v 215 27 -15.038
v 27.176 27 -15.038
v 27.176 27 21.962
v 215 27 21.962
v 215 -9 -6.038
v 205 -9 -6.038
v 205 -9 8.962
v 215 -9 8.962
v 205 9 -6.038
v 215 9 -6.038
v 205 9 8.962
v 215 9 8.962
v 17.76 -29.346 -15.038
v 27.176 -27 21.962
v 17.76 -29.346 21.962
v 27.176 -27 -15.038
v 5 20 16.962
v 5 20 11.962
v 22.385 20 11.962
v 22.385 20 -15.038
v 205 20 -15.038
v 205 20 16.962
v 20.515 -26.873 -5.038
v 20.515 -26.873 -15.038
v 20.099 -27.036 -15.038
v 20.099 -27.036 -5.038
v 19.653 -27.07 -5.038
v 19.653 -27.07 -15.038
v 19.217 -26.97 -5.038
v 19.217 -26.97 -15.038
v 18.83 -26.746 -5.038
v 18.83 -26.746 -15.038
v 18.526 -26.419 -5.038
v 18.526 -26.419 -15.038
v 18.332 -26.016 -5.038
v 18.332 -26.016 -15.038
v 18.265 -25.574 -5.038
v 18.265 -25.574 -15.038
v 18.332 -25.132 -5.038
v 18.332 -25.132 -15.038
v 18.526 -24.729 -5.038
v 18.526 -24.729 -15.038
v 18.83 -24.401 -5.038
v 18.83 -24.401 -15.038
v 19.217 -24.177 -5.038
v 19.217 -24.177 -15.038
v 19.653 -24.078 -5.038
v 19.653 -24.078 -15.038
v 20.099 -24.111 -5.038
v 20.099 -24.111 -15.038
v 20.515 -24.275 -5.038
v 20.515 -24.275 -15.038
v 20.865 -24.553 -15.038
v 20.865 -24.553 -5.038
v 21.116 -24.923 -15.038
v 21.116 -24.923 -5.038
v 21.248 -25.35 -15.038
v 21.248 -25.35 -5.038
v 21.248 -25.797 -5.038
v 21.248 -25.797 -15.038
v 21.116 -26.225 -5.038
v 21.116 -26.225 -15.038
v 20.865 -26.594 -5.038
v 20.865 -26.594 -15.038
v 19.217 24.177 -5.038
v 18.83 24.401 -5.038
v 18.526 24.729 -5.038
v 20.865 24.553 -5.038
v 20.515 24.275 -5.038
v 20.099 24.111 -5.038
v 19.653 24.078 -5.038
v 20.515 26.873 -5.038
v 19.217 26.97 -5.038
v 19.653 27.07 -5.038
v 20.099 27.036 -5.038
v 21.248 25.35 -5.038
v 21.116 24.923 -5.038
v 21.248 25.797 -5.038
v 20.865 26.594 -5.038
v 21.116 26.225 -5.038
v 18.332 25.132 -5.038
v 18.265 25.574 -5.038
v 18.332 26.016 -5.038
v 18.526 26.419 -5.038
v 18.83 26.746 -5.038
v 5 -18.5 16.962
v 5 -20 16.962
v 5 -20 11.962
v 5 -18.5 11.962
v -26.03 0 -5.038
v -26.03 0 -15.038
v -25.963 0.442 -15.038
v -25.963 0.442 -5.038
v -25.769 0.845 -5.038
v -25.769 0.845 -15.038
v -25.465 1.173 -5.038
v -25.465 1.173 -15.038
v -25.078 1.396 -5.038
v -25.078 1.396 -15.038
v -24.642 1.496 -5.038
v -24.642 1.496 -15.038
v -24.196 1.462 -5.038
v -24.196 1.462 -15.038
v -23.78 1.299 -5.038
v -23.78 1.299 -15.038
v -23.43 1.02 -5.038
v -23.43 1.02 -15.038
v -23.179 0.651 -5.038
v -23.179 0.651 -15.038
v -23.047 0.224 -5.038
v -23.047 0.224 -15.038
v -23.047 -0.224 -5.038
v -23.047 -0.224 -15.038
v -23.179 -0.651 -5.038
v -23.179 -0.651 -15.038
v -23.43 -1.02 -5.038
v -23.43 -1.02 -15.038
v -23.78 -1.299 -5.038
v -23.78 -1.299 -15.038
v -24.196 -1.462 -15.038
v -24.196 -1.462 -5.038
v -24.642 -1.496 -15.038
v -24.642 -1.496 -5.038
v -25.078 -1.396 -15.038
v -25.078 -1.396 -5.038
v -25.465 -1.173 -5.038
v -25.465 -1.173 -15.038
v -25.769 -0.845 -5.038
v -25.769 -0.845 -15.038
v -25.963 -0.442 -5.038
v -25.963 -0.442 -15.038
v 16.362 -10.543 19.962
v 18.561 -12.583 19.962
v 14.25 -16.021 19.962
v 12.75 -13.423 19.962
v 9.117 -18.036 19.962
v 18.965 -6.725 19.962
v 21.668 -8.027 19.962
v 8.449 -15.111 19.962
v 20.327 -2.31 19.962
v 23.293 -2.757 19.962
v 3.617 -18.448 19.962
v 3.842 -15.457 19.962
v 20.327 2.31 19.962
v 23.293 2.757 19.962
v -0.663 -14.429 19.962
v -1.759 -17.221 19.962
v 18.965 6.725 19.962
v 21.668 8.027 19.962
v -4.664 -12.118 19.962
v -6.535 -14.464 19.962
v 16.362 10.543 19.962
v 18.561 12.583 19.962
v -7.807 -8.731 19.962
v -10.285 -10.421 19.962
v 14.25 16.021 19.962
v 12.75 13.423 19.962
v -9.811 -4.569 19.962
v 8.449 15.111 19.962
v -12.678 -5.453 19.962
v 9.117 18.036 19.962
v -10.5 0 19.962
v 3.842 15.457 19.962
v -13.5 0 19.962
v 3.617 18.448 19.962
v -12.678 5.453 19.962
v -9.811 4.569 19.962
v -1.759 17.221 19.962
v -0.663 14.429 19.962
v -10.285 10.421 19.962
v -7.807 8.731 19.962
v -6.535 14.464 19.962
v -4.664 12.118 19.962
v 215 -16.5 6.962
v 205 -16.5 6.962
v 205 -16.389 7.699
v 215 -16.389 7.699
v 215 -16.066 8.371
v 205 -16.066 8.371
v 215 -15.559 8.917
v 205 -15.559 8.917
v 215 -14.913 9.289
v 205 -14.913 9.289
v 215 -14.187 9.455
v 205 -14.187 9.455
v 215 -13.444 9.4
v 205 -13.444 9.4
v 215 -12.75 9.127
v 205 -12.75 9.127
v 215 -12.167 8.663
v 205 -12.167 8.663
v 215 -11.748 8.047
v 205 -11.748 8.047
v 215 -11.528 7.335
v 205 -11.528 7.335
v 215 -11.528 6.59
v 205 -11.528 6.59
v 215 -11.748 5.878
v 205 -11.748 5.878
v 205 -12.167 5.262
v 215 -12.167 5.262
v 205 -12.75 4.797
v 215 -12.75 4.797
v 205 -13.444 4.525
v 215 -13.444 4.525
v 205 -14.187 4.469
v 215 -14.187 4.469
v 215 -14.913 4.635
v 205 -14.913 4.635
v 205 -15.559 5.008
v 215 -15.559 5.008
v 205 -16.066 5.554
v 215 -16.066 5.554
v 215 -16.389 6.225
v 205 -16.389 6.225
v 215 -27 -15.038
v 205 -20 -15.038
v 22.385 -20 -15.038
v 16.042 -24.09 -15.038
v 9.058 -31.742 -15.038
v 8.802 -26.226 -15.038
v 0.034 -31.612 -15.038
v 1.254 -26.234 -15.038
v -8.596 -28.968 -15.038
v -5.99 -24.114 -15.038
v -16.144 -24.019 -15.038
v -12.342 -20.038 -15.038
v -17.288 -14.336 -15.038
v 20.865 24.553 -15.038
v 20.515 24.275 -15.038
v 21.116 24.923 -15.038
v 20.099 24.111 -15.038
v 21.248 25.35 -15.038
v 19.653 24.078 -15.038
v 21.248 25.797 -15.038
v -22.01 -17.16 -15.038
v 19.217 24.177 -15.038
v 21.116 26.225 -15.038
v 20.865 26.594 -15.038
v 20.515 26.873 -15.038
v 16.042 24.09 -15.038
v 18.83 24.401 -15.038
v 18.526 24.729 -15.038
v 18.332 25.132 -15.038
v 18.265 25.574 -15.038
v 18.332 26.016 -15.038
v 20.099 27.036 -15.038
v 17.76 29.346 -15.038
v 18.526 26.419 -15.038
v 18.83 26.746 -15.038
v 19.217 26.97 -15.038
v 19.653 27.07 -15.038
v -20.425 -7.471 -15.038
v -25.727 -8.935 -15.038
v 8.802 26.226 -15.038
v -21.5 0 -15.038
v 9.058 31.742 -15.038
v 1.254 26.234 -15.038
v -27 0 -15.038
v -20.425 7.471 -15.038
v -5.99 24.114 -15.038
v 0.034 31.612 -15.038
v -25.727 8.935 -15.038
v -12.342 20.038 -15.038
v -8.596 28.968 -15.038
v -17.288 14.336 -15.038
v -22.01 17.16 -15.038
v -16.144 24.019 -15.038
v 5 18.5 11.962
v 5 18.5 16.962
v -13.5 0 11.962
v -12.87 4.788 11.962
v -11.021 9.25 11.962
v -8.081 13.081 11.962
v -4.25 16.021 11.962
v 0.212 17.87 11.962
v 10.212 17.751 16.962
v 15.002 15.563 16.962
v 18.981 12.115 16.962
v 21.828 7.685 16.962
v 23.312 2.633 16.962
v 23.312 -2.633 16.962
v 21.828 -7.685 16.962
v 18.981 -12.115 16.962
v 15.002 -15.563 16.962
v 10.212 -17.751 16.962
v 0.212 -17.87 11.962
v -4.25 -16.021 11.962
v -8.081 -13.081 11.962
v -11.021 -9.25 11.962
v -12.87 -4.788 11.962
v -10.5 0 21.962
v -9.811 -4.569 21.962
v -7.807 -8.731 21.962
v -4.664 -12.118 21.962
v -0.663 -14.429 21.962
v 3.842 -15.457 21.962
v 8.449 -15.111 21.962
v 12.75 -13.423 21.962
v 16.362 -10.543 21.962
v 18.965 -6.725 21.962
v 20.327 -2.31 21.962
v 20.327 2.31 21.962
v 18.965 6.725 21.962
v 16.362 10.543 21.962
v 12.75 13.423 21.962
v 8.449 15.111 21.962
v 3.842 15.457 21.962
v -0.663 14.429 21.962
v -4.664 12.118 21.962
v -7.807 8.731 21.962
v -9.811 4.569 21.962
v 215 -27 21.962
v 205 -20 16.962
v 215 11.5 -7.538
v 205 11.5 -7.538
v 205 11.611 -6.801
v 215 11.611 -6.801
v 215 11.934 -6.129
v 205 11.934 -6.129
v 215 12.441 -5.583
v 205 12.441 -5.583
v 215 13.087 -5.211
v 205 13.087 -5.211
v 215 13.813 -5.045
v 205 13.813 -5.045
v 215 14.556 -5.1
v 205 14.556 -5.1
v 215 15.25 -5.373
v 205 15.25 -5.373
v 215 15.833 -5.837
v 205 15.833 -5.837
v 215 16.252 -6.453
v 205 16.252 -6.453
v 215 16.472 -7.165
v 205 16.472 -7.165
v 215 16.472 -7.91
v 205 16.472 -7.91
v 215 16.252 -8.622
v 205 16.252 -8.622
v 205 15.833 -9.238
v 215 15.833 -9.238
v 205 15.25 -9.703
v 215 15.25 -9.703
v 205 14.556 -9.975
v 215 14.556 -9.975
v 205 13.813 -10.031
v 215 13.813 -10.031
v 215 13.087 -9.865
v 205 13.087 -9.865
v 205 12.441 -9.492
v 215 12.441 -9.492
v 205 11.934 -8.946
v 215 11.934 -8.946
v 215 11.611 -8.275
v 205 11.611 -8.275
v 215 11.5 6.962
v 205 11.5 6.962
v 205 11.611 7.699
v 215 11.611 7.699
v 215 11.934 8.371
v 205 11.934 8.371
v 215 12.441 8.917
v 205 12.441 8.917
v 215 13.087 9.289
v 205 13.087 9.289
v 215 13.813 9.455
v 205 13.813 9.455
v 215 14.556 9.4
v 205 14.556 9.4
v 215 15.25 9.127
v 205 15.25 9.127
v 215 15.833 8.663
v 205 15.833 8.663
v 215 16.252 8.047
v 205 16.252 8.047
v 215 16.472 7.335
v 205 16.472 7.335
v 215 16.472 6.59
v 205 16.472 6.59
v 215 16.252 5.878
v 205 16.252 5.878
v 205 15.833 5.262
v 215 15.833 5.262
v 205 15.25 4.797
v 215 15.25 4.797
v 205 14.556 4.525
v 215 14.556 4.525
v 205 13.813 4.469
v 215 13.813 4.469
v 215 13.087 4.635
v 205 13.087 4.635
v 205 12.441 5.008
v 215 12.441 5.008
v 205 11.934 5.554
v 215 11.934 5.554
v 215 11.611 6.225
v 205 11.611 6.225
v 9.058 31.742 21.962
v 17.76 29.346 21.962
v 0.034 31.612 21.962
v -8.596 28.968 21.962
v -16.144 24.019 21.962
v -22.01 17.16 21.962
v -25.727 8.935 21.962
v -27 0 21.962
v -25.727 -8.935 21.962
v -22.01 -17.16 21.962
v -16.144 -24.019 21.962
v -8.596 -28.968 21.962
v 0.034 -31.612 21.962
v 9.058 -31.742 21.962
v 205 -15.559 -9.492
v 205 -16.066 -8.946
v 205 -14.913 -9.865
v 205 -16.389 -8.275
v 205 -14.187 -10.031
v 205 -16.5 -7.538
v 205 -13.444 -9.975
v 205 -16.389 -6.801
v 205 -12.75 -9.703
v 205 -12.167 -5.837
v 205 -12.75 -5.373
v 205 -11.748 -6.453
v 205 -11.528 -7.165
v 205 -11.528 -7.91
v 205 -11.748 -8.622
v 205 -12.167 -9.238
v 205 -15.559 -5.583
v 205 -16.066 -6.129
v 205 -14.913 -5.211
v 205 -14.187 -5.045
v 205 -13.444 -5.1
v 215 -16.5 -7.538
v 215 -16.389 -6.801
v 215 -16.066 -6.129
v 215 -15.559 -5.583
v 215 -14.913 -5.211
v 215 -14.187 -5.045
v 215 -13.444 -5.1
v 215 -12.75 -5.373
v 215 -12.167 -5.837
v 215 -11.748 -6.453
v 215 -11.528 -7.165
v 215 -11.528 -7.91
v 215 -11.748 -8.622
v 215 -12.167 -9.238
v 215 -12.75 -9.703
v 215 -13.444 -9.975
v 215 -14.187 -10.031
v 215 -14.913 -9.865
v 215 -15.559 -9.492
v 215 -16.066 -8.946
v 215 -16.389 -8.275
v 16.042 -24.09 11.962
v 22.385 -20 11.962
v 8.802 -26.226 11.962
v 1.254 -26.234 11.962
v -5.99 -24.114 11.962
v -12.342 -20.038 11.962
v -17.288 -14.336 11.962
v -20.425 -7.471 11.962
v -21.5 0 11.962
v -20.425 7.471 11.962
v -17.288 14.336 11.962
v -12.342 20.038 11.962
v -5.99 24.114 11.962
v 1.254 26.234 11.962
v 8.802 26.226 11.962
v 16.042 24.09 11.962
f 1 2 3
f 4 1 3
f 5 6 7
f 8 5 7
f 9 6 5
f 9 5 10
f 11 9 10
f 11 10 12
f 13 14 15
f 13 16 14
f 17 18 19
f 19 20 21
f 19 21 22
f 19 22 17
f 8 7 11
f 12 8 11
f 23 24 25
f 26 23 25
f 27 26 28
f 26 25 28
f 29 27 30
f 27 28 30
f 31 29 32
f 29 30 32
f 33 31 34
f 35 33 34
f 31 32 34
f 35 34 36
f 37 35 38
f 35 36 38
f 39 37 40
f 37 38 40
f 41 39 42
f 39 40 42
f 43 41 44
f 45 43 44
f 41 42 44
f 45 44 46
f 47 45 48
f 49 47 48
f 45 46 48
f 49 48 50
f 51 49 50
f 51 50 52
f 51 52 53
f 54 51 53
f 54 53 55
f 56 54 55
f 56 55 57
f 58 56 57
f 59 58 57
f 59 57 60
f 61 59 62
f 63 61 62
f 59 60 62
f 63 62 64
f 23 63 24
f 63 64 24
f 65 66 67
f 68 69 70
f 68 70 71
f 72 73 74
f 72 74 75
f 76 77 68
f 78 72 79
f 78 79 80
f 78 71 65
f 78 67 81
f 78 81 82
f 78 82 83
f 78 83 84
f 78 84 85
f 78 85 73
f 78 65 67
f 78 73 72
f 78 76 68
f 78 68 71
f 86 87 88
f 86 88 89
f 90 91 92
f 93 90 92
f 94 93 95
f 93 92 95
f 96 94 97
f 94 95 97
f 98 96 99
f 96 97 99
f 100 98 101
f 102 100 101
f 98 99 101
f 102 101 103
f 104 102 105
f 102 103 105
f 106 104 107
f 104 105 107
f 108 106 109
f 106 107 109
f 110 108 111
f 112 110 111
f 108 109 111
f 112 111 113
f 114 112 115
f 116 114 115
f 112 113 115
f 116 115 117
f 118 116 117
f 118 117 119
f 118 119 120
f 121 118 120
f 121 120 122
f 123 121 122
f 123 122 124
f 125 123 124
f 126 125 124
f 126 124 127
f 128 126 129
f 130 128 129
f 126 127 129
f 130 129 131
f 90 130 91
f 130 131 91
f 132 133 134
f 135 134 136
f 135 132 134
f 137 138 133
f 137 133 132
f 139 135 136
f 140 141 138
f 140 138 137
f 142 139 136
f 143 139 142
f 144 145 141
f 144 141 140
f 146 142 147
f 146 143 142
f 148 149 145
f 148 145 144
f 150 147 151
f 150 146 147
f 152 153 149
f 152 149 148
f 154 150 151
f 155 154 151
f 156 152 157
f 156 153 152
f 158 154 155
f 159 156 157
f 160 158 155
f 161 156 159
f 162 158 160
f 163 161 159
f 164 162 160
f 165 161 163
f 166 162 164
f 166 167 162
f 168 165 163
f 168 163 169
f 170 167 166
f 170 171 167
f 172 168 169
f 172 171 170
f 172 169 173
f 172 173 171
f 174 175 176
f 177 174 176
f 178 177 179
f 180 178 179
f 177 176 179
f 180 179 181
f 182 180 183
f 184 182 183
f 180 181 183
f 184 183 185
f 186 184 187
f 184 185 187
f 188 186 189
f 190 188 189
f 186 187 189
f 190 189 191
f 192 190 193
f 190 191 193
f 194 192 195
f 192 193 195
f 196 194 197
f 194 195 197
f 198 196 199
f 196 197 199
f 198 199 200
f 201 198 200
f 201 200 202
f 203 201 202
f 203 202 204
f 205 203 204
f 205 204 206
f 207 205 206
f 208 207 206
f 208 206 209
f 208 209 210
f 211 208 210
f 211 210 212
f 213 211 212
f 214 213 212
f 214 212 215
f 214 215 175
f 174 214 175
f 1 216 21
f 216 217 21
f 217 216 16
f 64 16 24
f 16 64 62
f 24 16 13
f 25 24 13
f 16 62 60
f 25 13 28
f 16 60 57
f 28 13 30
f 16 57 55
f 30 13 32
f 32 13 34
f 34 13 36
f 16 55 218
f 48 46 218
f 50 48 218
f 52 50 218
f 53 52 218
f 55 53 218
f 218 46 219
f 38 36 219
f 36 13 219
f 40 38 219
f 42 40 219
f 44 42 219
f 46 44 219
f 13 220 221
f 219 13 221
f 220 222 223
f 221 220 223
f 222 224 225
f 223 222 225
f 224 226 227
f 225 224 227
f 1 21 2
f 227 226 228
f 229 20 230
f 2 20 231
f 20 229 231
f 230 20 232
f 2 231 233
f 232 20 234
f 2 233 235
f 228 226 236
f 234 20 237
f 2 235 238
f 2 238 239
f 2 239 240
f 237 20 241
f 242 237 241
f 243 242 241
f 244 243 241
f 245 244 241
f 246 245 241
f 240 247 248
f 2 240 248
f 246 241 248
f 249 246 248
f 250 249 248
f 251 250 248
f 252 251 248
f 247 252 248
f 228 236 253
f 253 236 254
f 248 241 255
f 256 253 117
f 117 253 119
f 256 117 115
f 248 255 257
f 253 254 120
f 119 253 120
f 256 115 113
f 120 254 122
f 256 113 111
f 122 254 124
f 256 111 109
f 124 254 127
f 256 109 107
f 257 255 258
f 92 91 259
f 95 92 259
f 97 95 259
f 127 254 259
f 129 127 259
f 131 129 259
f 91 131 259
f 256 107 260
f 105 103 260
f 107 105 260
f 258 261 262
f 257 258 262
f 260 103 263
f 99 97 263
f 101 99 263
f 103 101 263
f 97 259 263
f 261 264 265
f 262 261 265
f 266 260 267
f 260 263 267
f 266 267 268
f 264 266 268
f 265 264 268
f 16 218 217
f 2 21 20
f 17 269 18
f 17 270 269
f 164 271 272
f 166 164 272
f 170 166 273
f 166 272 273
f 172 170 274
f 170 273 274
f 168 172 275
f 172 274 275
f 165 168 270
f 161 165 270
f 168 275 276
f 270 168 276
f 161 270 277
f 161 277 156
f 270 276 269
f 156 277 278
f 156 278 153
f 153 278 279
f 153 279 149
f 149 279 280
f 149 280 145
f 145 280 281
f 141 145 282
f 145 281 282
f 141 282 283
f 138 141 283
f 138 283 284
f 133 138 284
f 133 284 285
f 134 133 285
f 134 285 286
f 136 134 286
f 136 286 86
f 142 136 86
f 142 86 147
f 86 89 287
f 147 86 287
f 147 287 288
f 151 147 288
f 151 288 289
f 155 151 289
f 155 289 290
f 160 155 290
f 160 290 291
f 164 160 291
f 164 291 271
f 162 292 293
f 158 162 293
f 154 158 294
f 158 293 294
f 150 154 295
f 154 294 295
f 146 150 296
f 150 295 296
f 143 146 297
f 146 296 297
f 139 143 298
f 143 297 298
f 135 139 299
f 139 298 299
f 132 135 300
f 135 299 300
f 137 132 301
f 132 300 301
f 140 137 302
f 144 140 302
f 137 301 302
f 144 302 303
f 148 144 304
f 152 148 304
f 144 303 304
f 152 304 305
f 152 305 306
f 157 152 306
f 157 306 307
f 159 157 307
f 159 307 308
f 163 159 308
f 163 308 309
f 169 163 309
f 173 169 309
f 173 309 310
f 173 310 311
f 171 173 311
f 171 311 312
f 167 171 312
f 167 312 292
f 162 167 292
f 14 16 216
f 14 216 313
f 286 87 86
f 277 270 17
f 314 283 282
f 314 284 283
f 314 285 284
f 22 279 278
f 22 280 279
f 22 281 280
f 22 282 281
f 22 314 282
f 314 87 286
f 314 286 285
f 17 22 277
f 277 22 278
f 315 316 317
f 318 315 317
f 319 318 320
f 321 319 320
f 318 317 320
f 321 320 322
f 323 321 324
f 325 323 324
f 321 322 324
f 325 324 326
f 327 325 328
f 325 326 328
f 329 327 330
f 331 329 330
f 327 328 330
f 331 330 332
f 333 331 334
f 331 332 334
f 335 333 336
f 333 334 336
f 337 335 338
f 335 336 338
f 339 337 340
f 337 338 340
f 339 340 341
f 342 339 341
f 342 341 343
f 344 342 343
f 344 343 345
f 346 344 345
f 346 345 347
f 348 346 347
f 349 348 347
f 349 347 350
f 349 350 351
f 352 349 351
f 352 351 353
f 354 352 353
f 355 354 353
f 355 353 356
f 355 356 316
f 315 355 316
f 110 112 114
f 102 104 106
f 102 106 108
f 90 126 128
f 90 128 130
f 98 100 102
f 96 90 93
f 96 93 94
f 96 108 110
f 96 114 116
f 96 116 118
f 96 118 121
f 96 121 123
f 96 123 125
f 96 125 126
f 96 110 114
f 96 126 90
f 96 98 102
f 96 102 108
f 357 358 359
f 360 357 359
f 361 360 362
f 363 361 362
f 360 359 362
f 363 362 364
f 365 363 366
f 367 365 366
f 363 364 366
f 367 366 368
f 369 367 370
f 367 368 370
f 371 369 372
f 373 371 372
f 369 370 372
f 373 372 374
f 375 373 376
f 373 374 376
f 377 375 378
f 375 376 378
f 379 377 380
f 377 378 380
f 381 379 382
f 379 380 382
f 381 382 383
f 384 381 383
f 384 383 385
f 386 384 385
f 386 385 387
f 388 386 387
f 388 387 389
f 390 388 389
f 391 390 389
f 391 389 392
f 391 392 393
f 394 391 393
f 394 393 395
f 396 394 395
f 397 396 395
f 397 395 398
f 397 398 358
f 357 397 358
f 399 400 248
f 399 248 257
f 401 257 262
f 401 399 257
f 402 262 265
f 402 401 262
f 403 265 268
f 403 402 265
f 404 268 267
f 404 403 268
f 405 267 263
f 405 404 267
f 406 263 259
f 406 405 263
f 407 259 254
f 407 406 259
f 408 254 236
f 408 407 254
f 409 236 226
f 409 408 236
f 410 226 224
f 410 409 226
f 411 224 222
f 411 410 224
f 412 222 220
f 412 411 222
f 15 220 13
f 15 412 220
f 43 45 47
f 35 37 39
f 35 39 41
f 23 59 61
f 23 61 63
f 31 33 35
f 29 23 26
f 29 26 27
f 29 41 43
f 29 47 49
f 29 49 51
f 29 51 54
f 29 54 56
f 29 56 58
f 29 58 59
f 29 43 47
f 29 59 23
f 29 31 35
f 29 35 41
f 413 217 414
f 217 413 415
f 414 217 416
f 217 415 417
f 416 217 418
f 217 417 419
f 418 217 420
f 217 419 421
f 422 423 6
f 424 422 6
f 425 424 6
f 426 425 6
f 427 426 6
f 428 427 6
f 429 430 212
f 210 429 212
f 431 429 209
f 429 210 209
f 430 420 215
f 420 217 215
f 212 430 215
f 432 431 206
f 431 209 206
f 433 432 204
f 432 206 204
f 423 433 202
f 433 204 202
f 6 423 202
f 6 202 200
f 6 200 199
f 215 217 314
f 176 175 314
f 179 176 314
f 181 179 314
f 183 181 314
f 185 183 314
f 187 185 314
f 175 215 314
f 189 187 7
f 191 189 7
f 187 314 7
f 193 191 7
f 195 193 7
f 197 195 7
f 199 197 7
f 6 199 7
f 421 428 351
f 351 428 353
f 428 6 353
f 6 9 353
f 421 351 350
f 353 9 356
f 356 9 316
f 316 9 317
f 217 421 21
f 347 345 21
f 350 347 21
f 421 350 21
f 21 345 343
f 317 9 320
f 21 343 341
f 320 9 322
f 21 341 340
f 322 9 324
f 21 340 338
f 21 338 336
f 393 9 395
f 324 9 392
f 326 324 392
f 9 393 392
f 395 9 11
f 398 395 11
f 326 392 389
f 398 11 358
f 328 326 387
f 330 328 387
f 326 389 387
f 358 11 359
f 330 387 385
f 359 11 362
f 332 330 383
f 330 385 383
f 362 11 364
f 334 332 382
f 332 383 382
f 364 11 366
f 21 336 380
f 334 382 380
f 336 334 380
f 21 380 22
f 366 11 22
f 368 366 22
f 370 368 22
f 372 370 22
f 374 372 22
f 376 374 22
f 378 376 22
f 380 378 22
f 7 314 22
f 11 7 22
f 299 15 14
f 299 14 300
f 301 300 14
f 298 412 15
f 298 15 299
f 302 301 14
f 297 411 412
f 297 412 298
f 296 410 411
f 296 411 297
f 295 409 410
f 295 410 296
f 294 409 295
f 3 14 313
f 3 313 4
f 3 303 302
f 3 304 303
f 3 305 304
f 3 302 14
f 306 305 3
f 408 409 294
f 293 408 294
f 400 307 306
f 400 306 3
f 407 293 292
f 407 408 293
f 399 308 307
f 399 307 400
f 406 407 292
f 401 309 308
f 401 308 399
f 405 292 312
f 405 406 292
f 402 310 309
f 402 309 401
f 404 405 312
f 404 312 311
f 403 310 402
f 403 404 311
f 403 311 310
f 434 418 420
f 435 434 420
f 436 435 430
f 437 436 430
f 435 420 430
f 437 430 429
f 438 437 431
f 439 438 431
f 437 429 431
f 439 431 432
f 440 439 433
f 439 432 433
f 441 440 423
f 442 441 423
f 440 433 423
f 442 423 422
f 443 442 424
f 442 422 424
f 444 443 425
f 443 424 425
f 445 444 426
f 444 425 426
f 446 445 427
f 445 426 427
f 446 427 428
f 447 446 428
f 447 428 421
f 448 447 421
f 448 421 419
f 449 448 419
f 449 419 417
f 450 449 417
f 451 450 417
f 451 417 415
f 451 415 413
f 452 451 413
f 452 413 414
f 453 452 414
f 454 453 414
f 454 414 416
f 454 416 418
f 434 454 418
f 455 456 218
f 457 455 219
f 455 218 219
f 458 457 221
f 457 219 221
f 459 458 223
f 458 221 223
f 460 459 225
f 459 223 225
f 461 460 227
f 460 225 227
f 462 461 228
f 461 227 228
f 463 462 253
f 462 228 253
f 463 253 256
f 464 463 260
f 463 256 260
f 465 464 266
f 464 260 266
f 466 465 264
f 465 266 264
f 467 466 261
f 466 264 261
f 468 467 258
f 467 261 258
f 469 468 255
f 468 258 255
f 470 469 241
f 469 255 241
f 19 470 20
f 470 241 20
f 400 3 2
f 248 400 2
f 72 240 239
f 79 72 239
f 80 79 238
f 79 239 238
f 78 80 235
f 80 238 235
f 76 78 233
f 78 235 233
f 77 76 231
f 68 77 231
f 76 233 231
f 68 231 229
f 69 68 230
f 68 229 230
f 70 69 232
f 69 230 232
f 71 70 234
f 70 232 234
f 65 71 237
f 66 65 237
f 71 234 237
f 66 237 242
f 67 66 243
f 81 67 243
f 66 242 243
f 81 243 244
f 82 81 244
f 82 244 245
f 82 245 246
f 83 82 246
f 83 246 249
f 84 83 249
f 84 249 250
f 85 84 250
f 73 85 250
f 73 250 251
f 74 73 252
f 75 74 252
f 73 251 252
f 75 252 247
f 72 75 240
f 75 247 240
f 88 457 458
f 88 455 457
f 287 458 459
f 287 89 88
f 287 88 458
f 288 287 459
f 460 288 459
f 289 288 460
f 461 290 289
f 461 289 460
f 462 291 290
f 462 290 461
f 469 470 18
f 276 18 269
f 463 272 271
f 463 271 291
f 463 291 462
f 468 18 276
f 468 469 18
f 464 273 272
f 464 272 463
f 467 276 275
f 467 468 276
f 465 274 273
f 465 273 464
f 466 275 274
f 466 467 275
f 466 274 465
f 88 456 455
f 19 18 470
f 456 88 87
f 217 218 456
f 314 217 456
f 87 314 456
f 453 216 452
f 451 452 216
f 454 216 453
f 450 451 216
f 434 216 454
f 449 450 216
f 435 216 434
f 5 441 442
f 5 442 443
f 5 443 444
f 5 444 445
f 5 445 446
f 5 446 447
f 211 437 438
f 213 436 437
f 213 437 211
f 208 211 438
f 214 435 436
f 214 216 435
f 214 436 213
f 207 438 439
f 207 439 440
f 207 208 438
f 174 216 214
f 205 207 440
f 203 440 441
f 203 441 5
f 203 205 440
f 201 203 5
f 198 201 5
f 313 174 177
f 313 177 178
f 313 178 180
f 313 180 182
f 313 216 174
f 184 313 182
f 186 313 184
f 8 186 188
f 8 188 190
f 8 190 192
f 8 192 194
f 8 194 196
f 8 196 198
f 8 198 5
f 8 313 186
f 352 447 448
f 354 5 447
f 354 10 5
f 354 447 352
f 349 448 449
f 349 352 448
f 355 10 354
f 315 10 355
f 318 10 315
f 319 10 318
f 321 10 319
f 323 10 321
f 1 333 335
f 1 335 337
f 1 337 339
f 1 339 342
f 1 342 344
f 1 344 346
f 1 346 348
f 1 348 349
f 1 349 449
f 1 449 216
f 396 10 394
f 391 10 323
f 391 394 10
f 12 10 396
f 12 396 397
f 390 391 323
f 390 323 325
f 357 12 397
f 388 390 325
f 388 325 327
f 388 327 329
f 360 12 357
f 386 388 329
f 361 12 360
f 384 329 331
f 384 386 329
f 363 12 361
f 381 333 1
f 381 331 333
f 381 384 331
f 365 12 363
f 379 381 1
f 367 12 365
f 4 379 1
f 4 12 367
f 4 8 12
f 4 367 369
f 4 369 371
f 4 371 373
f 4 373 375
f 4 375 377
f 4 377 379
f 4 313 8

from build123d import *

# Parameters (mm, degrees)
SKETCH025_R           = 32
PAD016_DEPTH          = 37
SKETCH026_R           = 18.5
POCKET001_DEPTH       = 35
SKETCH027_R           = 26.5
POCKET002_DEPTH       = 27
SKETCH028_R           = 15.5
POCKET003_DEPTH       = 37.001
PAD018_DEPTH          = 37
SKETCH034_W           = 40
SKETCH034_H           = 32
POCKET004_DEPTH       = 200
SKETCH046_W           = 54
SKETCH046_H           = 37
SKETCH046_W_2         = 18
SKETCH046_H_2         = 15
PAD020_DEPTH          = 10
SKETCH047_R           = 1.5
POCKET_DEPTH          = 10
POLARPATTERN003_COUNT = 3
CHAMFER002_SIZE       = 5
SKETCH063_R           = 2.5
POCKET022_DEPTH       = 10.001
BODY_PLACEMENT_ANGLE  = 179.999986


with BuildPart() as part:
    # Sketch025 (on Face1 of CopyPocket) → Pad016 (new body)
    with BuildSketch(Plane.XY.offset(19.5)):
        Circle(SKETCH025_R)
    extrude(amount=-PAD016_DEPTH)

    # Sketch026 (on Face3 of Pad016) → Pocket001 (cut)
    with BuildSketch(Plane(origin=(0, 0, -17.5), x_dir=(1, 0, 0), z_dir=(0, 0, -1))):
        Circle(SKETCH026_R)
    extrude(amount=-POCKET001_DEPTH, mode=Mode.SUBTRACT)

    # Sketch027 (on Face3 of Pocket001) → Pocket002 (cut)
    with BuildSketch(Plane(origin=(0, 0, -17.5), x_dir=(1, 0, 0), z_dir=(0, 0, -1))):
        Circle(SKETCH027_R)
    extrude(amount=-POCKET002_DEPTH, mode=Mode.SUBTRACT)

    # Sketch028 (on Face2 of Pocket002) → Pocket003 (cut, through all)
    with BuildSketch(Plane.XY.offset(19.5)):
        Circle(SKETCH028_R)
    extrude(amount=-POCKET003_DEPTH, mode=Mode.SUBTRACT)

    # Sketch030 (on Face2 of Pocket003) → Pad018 (join)
    with BuildSketch(Plane.XY.offset(19.5)):
        with BuildLine():
            ThreePointArc((-17.175564, 27), (-32, 0), (-17.175564, -27))
            Line((-200, -27), (-17.175564, -27))
            Line((-200, 27), (-200, -27))
            Line((-17.175564, 27), (-200, 27))
        make_face()
    extrude(amount=-PAD018_DEPTH)

    # Sketch034 (on Face2 of Pad018) → Pocket004 (cut)
    with BuildSketch(Plane(origin=(-200, 0, 0), x_dir=(0, -1, 0), z_dir=(-1, 0, 0))):
        with Locations((0, -1.5)):
            Rectangle(SKETCH034_W, SKETCH034_H)
    extrude(amount=-POCKET004_DEPTH, mode=Mode.SUBTRACT)

    # Sketch046 (on Face3 of Pocket004) → Pad020 (join)
    with BuildSketch(Plane(origin=(-200, 0, 0), x_dir=(0, -1, 0), z_dir=(-1, 0, 0))):
        with Locations((0, 1)):
            Rectangle(SKETCH046_W, SKETCH046_H)
        with Locations((0, -1)):
            Rectangle(SKETCH046_W_2, SKETCH046_H_2, mode=Mode.SUBTRACT)
    extrude(amount=PAD020_DEPTH)

    # Sketch047 (on Face20 of Pad020) → Pocket (cut)
    with BuildSketch(Plane(origin=(0, 0, -17.5), x_dir=(1, 0, 0), z_dir=(0, 0, -1))):
        with Locations((29.53, 0)):
            Circle(SKETCH047_R)
    pocket = extrude(amount=-POCKET_DEPTH, mode=Mode.SUBTRACT)

    # PolarPattern003: Pocket ×3 about axis
    polarpattern003_axis = Axis((0, 0, -17.5), (0, 0, -1))
    for i in range(1, POLARPATTERN003_COUNT):
        add(pocket.rotate(polarpattern003_axis, i * 360 / POLARPATTERN003_COUNT), mode=Mode.SUBTRACT)

    # Chamfer002
    chamfer002_edges = [part.edges().sort_by_distance(p)[0] for p in [
        (-17.175564, -27, 1),
        (-17.175564, 27, 1),
    ]]
    chamfer(chamfer002_edges, length=CHAMFER002_SIZE)

    # Sketch063 (on Face14 of Chamfer002) → Pocket022 (cut, through all)
    with BuildSketch(Plane.YZ.offset(-200)):
        with Locations((-14, 4.5)):
            Circle(SKETCH063_R)
        with Locations((14, 4.5)):
            Circle(SKETCH063_R)
        with Locations((-14, -10)):
            Circle(SKETCH063_R)
        with Locations((14, -10)):
            Circle(SKETCH063_R)
    extrude(amount=-POCKET022_DEPTH, mode=Mode.SUBTRACT)


with BuildPart() as part_1:
    # Body placement: moved
    add(part.part.moved(Location((5, -1e-06, 2.46221))).rotate(Axis((5, -1e-06, 2.46221), (0, 0, 1)), BODY_PLACEMENT_ANGLE))


solid = part_1.part
